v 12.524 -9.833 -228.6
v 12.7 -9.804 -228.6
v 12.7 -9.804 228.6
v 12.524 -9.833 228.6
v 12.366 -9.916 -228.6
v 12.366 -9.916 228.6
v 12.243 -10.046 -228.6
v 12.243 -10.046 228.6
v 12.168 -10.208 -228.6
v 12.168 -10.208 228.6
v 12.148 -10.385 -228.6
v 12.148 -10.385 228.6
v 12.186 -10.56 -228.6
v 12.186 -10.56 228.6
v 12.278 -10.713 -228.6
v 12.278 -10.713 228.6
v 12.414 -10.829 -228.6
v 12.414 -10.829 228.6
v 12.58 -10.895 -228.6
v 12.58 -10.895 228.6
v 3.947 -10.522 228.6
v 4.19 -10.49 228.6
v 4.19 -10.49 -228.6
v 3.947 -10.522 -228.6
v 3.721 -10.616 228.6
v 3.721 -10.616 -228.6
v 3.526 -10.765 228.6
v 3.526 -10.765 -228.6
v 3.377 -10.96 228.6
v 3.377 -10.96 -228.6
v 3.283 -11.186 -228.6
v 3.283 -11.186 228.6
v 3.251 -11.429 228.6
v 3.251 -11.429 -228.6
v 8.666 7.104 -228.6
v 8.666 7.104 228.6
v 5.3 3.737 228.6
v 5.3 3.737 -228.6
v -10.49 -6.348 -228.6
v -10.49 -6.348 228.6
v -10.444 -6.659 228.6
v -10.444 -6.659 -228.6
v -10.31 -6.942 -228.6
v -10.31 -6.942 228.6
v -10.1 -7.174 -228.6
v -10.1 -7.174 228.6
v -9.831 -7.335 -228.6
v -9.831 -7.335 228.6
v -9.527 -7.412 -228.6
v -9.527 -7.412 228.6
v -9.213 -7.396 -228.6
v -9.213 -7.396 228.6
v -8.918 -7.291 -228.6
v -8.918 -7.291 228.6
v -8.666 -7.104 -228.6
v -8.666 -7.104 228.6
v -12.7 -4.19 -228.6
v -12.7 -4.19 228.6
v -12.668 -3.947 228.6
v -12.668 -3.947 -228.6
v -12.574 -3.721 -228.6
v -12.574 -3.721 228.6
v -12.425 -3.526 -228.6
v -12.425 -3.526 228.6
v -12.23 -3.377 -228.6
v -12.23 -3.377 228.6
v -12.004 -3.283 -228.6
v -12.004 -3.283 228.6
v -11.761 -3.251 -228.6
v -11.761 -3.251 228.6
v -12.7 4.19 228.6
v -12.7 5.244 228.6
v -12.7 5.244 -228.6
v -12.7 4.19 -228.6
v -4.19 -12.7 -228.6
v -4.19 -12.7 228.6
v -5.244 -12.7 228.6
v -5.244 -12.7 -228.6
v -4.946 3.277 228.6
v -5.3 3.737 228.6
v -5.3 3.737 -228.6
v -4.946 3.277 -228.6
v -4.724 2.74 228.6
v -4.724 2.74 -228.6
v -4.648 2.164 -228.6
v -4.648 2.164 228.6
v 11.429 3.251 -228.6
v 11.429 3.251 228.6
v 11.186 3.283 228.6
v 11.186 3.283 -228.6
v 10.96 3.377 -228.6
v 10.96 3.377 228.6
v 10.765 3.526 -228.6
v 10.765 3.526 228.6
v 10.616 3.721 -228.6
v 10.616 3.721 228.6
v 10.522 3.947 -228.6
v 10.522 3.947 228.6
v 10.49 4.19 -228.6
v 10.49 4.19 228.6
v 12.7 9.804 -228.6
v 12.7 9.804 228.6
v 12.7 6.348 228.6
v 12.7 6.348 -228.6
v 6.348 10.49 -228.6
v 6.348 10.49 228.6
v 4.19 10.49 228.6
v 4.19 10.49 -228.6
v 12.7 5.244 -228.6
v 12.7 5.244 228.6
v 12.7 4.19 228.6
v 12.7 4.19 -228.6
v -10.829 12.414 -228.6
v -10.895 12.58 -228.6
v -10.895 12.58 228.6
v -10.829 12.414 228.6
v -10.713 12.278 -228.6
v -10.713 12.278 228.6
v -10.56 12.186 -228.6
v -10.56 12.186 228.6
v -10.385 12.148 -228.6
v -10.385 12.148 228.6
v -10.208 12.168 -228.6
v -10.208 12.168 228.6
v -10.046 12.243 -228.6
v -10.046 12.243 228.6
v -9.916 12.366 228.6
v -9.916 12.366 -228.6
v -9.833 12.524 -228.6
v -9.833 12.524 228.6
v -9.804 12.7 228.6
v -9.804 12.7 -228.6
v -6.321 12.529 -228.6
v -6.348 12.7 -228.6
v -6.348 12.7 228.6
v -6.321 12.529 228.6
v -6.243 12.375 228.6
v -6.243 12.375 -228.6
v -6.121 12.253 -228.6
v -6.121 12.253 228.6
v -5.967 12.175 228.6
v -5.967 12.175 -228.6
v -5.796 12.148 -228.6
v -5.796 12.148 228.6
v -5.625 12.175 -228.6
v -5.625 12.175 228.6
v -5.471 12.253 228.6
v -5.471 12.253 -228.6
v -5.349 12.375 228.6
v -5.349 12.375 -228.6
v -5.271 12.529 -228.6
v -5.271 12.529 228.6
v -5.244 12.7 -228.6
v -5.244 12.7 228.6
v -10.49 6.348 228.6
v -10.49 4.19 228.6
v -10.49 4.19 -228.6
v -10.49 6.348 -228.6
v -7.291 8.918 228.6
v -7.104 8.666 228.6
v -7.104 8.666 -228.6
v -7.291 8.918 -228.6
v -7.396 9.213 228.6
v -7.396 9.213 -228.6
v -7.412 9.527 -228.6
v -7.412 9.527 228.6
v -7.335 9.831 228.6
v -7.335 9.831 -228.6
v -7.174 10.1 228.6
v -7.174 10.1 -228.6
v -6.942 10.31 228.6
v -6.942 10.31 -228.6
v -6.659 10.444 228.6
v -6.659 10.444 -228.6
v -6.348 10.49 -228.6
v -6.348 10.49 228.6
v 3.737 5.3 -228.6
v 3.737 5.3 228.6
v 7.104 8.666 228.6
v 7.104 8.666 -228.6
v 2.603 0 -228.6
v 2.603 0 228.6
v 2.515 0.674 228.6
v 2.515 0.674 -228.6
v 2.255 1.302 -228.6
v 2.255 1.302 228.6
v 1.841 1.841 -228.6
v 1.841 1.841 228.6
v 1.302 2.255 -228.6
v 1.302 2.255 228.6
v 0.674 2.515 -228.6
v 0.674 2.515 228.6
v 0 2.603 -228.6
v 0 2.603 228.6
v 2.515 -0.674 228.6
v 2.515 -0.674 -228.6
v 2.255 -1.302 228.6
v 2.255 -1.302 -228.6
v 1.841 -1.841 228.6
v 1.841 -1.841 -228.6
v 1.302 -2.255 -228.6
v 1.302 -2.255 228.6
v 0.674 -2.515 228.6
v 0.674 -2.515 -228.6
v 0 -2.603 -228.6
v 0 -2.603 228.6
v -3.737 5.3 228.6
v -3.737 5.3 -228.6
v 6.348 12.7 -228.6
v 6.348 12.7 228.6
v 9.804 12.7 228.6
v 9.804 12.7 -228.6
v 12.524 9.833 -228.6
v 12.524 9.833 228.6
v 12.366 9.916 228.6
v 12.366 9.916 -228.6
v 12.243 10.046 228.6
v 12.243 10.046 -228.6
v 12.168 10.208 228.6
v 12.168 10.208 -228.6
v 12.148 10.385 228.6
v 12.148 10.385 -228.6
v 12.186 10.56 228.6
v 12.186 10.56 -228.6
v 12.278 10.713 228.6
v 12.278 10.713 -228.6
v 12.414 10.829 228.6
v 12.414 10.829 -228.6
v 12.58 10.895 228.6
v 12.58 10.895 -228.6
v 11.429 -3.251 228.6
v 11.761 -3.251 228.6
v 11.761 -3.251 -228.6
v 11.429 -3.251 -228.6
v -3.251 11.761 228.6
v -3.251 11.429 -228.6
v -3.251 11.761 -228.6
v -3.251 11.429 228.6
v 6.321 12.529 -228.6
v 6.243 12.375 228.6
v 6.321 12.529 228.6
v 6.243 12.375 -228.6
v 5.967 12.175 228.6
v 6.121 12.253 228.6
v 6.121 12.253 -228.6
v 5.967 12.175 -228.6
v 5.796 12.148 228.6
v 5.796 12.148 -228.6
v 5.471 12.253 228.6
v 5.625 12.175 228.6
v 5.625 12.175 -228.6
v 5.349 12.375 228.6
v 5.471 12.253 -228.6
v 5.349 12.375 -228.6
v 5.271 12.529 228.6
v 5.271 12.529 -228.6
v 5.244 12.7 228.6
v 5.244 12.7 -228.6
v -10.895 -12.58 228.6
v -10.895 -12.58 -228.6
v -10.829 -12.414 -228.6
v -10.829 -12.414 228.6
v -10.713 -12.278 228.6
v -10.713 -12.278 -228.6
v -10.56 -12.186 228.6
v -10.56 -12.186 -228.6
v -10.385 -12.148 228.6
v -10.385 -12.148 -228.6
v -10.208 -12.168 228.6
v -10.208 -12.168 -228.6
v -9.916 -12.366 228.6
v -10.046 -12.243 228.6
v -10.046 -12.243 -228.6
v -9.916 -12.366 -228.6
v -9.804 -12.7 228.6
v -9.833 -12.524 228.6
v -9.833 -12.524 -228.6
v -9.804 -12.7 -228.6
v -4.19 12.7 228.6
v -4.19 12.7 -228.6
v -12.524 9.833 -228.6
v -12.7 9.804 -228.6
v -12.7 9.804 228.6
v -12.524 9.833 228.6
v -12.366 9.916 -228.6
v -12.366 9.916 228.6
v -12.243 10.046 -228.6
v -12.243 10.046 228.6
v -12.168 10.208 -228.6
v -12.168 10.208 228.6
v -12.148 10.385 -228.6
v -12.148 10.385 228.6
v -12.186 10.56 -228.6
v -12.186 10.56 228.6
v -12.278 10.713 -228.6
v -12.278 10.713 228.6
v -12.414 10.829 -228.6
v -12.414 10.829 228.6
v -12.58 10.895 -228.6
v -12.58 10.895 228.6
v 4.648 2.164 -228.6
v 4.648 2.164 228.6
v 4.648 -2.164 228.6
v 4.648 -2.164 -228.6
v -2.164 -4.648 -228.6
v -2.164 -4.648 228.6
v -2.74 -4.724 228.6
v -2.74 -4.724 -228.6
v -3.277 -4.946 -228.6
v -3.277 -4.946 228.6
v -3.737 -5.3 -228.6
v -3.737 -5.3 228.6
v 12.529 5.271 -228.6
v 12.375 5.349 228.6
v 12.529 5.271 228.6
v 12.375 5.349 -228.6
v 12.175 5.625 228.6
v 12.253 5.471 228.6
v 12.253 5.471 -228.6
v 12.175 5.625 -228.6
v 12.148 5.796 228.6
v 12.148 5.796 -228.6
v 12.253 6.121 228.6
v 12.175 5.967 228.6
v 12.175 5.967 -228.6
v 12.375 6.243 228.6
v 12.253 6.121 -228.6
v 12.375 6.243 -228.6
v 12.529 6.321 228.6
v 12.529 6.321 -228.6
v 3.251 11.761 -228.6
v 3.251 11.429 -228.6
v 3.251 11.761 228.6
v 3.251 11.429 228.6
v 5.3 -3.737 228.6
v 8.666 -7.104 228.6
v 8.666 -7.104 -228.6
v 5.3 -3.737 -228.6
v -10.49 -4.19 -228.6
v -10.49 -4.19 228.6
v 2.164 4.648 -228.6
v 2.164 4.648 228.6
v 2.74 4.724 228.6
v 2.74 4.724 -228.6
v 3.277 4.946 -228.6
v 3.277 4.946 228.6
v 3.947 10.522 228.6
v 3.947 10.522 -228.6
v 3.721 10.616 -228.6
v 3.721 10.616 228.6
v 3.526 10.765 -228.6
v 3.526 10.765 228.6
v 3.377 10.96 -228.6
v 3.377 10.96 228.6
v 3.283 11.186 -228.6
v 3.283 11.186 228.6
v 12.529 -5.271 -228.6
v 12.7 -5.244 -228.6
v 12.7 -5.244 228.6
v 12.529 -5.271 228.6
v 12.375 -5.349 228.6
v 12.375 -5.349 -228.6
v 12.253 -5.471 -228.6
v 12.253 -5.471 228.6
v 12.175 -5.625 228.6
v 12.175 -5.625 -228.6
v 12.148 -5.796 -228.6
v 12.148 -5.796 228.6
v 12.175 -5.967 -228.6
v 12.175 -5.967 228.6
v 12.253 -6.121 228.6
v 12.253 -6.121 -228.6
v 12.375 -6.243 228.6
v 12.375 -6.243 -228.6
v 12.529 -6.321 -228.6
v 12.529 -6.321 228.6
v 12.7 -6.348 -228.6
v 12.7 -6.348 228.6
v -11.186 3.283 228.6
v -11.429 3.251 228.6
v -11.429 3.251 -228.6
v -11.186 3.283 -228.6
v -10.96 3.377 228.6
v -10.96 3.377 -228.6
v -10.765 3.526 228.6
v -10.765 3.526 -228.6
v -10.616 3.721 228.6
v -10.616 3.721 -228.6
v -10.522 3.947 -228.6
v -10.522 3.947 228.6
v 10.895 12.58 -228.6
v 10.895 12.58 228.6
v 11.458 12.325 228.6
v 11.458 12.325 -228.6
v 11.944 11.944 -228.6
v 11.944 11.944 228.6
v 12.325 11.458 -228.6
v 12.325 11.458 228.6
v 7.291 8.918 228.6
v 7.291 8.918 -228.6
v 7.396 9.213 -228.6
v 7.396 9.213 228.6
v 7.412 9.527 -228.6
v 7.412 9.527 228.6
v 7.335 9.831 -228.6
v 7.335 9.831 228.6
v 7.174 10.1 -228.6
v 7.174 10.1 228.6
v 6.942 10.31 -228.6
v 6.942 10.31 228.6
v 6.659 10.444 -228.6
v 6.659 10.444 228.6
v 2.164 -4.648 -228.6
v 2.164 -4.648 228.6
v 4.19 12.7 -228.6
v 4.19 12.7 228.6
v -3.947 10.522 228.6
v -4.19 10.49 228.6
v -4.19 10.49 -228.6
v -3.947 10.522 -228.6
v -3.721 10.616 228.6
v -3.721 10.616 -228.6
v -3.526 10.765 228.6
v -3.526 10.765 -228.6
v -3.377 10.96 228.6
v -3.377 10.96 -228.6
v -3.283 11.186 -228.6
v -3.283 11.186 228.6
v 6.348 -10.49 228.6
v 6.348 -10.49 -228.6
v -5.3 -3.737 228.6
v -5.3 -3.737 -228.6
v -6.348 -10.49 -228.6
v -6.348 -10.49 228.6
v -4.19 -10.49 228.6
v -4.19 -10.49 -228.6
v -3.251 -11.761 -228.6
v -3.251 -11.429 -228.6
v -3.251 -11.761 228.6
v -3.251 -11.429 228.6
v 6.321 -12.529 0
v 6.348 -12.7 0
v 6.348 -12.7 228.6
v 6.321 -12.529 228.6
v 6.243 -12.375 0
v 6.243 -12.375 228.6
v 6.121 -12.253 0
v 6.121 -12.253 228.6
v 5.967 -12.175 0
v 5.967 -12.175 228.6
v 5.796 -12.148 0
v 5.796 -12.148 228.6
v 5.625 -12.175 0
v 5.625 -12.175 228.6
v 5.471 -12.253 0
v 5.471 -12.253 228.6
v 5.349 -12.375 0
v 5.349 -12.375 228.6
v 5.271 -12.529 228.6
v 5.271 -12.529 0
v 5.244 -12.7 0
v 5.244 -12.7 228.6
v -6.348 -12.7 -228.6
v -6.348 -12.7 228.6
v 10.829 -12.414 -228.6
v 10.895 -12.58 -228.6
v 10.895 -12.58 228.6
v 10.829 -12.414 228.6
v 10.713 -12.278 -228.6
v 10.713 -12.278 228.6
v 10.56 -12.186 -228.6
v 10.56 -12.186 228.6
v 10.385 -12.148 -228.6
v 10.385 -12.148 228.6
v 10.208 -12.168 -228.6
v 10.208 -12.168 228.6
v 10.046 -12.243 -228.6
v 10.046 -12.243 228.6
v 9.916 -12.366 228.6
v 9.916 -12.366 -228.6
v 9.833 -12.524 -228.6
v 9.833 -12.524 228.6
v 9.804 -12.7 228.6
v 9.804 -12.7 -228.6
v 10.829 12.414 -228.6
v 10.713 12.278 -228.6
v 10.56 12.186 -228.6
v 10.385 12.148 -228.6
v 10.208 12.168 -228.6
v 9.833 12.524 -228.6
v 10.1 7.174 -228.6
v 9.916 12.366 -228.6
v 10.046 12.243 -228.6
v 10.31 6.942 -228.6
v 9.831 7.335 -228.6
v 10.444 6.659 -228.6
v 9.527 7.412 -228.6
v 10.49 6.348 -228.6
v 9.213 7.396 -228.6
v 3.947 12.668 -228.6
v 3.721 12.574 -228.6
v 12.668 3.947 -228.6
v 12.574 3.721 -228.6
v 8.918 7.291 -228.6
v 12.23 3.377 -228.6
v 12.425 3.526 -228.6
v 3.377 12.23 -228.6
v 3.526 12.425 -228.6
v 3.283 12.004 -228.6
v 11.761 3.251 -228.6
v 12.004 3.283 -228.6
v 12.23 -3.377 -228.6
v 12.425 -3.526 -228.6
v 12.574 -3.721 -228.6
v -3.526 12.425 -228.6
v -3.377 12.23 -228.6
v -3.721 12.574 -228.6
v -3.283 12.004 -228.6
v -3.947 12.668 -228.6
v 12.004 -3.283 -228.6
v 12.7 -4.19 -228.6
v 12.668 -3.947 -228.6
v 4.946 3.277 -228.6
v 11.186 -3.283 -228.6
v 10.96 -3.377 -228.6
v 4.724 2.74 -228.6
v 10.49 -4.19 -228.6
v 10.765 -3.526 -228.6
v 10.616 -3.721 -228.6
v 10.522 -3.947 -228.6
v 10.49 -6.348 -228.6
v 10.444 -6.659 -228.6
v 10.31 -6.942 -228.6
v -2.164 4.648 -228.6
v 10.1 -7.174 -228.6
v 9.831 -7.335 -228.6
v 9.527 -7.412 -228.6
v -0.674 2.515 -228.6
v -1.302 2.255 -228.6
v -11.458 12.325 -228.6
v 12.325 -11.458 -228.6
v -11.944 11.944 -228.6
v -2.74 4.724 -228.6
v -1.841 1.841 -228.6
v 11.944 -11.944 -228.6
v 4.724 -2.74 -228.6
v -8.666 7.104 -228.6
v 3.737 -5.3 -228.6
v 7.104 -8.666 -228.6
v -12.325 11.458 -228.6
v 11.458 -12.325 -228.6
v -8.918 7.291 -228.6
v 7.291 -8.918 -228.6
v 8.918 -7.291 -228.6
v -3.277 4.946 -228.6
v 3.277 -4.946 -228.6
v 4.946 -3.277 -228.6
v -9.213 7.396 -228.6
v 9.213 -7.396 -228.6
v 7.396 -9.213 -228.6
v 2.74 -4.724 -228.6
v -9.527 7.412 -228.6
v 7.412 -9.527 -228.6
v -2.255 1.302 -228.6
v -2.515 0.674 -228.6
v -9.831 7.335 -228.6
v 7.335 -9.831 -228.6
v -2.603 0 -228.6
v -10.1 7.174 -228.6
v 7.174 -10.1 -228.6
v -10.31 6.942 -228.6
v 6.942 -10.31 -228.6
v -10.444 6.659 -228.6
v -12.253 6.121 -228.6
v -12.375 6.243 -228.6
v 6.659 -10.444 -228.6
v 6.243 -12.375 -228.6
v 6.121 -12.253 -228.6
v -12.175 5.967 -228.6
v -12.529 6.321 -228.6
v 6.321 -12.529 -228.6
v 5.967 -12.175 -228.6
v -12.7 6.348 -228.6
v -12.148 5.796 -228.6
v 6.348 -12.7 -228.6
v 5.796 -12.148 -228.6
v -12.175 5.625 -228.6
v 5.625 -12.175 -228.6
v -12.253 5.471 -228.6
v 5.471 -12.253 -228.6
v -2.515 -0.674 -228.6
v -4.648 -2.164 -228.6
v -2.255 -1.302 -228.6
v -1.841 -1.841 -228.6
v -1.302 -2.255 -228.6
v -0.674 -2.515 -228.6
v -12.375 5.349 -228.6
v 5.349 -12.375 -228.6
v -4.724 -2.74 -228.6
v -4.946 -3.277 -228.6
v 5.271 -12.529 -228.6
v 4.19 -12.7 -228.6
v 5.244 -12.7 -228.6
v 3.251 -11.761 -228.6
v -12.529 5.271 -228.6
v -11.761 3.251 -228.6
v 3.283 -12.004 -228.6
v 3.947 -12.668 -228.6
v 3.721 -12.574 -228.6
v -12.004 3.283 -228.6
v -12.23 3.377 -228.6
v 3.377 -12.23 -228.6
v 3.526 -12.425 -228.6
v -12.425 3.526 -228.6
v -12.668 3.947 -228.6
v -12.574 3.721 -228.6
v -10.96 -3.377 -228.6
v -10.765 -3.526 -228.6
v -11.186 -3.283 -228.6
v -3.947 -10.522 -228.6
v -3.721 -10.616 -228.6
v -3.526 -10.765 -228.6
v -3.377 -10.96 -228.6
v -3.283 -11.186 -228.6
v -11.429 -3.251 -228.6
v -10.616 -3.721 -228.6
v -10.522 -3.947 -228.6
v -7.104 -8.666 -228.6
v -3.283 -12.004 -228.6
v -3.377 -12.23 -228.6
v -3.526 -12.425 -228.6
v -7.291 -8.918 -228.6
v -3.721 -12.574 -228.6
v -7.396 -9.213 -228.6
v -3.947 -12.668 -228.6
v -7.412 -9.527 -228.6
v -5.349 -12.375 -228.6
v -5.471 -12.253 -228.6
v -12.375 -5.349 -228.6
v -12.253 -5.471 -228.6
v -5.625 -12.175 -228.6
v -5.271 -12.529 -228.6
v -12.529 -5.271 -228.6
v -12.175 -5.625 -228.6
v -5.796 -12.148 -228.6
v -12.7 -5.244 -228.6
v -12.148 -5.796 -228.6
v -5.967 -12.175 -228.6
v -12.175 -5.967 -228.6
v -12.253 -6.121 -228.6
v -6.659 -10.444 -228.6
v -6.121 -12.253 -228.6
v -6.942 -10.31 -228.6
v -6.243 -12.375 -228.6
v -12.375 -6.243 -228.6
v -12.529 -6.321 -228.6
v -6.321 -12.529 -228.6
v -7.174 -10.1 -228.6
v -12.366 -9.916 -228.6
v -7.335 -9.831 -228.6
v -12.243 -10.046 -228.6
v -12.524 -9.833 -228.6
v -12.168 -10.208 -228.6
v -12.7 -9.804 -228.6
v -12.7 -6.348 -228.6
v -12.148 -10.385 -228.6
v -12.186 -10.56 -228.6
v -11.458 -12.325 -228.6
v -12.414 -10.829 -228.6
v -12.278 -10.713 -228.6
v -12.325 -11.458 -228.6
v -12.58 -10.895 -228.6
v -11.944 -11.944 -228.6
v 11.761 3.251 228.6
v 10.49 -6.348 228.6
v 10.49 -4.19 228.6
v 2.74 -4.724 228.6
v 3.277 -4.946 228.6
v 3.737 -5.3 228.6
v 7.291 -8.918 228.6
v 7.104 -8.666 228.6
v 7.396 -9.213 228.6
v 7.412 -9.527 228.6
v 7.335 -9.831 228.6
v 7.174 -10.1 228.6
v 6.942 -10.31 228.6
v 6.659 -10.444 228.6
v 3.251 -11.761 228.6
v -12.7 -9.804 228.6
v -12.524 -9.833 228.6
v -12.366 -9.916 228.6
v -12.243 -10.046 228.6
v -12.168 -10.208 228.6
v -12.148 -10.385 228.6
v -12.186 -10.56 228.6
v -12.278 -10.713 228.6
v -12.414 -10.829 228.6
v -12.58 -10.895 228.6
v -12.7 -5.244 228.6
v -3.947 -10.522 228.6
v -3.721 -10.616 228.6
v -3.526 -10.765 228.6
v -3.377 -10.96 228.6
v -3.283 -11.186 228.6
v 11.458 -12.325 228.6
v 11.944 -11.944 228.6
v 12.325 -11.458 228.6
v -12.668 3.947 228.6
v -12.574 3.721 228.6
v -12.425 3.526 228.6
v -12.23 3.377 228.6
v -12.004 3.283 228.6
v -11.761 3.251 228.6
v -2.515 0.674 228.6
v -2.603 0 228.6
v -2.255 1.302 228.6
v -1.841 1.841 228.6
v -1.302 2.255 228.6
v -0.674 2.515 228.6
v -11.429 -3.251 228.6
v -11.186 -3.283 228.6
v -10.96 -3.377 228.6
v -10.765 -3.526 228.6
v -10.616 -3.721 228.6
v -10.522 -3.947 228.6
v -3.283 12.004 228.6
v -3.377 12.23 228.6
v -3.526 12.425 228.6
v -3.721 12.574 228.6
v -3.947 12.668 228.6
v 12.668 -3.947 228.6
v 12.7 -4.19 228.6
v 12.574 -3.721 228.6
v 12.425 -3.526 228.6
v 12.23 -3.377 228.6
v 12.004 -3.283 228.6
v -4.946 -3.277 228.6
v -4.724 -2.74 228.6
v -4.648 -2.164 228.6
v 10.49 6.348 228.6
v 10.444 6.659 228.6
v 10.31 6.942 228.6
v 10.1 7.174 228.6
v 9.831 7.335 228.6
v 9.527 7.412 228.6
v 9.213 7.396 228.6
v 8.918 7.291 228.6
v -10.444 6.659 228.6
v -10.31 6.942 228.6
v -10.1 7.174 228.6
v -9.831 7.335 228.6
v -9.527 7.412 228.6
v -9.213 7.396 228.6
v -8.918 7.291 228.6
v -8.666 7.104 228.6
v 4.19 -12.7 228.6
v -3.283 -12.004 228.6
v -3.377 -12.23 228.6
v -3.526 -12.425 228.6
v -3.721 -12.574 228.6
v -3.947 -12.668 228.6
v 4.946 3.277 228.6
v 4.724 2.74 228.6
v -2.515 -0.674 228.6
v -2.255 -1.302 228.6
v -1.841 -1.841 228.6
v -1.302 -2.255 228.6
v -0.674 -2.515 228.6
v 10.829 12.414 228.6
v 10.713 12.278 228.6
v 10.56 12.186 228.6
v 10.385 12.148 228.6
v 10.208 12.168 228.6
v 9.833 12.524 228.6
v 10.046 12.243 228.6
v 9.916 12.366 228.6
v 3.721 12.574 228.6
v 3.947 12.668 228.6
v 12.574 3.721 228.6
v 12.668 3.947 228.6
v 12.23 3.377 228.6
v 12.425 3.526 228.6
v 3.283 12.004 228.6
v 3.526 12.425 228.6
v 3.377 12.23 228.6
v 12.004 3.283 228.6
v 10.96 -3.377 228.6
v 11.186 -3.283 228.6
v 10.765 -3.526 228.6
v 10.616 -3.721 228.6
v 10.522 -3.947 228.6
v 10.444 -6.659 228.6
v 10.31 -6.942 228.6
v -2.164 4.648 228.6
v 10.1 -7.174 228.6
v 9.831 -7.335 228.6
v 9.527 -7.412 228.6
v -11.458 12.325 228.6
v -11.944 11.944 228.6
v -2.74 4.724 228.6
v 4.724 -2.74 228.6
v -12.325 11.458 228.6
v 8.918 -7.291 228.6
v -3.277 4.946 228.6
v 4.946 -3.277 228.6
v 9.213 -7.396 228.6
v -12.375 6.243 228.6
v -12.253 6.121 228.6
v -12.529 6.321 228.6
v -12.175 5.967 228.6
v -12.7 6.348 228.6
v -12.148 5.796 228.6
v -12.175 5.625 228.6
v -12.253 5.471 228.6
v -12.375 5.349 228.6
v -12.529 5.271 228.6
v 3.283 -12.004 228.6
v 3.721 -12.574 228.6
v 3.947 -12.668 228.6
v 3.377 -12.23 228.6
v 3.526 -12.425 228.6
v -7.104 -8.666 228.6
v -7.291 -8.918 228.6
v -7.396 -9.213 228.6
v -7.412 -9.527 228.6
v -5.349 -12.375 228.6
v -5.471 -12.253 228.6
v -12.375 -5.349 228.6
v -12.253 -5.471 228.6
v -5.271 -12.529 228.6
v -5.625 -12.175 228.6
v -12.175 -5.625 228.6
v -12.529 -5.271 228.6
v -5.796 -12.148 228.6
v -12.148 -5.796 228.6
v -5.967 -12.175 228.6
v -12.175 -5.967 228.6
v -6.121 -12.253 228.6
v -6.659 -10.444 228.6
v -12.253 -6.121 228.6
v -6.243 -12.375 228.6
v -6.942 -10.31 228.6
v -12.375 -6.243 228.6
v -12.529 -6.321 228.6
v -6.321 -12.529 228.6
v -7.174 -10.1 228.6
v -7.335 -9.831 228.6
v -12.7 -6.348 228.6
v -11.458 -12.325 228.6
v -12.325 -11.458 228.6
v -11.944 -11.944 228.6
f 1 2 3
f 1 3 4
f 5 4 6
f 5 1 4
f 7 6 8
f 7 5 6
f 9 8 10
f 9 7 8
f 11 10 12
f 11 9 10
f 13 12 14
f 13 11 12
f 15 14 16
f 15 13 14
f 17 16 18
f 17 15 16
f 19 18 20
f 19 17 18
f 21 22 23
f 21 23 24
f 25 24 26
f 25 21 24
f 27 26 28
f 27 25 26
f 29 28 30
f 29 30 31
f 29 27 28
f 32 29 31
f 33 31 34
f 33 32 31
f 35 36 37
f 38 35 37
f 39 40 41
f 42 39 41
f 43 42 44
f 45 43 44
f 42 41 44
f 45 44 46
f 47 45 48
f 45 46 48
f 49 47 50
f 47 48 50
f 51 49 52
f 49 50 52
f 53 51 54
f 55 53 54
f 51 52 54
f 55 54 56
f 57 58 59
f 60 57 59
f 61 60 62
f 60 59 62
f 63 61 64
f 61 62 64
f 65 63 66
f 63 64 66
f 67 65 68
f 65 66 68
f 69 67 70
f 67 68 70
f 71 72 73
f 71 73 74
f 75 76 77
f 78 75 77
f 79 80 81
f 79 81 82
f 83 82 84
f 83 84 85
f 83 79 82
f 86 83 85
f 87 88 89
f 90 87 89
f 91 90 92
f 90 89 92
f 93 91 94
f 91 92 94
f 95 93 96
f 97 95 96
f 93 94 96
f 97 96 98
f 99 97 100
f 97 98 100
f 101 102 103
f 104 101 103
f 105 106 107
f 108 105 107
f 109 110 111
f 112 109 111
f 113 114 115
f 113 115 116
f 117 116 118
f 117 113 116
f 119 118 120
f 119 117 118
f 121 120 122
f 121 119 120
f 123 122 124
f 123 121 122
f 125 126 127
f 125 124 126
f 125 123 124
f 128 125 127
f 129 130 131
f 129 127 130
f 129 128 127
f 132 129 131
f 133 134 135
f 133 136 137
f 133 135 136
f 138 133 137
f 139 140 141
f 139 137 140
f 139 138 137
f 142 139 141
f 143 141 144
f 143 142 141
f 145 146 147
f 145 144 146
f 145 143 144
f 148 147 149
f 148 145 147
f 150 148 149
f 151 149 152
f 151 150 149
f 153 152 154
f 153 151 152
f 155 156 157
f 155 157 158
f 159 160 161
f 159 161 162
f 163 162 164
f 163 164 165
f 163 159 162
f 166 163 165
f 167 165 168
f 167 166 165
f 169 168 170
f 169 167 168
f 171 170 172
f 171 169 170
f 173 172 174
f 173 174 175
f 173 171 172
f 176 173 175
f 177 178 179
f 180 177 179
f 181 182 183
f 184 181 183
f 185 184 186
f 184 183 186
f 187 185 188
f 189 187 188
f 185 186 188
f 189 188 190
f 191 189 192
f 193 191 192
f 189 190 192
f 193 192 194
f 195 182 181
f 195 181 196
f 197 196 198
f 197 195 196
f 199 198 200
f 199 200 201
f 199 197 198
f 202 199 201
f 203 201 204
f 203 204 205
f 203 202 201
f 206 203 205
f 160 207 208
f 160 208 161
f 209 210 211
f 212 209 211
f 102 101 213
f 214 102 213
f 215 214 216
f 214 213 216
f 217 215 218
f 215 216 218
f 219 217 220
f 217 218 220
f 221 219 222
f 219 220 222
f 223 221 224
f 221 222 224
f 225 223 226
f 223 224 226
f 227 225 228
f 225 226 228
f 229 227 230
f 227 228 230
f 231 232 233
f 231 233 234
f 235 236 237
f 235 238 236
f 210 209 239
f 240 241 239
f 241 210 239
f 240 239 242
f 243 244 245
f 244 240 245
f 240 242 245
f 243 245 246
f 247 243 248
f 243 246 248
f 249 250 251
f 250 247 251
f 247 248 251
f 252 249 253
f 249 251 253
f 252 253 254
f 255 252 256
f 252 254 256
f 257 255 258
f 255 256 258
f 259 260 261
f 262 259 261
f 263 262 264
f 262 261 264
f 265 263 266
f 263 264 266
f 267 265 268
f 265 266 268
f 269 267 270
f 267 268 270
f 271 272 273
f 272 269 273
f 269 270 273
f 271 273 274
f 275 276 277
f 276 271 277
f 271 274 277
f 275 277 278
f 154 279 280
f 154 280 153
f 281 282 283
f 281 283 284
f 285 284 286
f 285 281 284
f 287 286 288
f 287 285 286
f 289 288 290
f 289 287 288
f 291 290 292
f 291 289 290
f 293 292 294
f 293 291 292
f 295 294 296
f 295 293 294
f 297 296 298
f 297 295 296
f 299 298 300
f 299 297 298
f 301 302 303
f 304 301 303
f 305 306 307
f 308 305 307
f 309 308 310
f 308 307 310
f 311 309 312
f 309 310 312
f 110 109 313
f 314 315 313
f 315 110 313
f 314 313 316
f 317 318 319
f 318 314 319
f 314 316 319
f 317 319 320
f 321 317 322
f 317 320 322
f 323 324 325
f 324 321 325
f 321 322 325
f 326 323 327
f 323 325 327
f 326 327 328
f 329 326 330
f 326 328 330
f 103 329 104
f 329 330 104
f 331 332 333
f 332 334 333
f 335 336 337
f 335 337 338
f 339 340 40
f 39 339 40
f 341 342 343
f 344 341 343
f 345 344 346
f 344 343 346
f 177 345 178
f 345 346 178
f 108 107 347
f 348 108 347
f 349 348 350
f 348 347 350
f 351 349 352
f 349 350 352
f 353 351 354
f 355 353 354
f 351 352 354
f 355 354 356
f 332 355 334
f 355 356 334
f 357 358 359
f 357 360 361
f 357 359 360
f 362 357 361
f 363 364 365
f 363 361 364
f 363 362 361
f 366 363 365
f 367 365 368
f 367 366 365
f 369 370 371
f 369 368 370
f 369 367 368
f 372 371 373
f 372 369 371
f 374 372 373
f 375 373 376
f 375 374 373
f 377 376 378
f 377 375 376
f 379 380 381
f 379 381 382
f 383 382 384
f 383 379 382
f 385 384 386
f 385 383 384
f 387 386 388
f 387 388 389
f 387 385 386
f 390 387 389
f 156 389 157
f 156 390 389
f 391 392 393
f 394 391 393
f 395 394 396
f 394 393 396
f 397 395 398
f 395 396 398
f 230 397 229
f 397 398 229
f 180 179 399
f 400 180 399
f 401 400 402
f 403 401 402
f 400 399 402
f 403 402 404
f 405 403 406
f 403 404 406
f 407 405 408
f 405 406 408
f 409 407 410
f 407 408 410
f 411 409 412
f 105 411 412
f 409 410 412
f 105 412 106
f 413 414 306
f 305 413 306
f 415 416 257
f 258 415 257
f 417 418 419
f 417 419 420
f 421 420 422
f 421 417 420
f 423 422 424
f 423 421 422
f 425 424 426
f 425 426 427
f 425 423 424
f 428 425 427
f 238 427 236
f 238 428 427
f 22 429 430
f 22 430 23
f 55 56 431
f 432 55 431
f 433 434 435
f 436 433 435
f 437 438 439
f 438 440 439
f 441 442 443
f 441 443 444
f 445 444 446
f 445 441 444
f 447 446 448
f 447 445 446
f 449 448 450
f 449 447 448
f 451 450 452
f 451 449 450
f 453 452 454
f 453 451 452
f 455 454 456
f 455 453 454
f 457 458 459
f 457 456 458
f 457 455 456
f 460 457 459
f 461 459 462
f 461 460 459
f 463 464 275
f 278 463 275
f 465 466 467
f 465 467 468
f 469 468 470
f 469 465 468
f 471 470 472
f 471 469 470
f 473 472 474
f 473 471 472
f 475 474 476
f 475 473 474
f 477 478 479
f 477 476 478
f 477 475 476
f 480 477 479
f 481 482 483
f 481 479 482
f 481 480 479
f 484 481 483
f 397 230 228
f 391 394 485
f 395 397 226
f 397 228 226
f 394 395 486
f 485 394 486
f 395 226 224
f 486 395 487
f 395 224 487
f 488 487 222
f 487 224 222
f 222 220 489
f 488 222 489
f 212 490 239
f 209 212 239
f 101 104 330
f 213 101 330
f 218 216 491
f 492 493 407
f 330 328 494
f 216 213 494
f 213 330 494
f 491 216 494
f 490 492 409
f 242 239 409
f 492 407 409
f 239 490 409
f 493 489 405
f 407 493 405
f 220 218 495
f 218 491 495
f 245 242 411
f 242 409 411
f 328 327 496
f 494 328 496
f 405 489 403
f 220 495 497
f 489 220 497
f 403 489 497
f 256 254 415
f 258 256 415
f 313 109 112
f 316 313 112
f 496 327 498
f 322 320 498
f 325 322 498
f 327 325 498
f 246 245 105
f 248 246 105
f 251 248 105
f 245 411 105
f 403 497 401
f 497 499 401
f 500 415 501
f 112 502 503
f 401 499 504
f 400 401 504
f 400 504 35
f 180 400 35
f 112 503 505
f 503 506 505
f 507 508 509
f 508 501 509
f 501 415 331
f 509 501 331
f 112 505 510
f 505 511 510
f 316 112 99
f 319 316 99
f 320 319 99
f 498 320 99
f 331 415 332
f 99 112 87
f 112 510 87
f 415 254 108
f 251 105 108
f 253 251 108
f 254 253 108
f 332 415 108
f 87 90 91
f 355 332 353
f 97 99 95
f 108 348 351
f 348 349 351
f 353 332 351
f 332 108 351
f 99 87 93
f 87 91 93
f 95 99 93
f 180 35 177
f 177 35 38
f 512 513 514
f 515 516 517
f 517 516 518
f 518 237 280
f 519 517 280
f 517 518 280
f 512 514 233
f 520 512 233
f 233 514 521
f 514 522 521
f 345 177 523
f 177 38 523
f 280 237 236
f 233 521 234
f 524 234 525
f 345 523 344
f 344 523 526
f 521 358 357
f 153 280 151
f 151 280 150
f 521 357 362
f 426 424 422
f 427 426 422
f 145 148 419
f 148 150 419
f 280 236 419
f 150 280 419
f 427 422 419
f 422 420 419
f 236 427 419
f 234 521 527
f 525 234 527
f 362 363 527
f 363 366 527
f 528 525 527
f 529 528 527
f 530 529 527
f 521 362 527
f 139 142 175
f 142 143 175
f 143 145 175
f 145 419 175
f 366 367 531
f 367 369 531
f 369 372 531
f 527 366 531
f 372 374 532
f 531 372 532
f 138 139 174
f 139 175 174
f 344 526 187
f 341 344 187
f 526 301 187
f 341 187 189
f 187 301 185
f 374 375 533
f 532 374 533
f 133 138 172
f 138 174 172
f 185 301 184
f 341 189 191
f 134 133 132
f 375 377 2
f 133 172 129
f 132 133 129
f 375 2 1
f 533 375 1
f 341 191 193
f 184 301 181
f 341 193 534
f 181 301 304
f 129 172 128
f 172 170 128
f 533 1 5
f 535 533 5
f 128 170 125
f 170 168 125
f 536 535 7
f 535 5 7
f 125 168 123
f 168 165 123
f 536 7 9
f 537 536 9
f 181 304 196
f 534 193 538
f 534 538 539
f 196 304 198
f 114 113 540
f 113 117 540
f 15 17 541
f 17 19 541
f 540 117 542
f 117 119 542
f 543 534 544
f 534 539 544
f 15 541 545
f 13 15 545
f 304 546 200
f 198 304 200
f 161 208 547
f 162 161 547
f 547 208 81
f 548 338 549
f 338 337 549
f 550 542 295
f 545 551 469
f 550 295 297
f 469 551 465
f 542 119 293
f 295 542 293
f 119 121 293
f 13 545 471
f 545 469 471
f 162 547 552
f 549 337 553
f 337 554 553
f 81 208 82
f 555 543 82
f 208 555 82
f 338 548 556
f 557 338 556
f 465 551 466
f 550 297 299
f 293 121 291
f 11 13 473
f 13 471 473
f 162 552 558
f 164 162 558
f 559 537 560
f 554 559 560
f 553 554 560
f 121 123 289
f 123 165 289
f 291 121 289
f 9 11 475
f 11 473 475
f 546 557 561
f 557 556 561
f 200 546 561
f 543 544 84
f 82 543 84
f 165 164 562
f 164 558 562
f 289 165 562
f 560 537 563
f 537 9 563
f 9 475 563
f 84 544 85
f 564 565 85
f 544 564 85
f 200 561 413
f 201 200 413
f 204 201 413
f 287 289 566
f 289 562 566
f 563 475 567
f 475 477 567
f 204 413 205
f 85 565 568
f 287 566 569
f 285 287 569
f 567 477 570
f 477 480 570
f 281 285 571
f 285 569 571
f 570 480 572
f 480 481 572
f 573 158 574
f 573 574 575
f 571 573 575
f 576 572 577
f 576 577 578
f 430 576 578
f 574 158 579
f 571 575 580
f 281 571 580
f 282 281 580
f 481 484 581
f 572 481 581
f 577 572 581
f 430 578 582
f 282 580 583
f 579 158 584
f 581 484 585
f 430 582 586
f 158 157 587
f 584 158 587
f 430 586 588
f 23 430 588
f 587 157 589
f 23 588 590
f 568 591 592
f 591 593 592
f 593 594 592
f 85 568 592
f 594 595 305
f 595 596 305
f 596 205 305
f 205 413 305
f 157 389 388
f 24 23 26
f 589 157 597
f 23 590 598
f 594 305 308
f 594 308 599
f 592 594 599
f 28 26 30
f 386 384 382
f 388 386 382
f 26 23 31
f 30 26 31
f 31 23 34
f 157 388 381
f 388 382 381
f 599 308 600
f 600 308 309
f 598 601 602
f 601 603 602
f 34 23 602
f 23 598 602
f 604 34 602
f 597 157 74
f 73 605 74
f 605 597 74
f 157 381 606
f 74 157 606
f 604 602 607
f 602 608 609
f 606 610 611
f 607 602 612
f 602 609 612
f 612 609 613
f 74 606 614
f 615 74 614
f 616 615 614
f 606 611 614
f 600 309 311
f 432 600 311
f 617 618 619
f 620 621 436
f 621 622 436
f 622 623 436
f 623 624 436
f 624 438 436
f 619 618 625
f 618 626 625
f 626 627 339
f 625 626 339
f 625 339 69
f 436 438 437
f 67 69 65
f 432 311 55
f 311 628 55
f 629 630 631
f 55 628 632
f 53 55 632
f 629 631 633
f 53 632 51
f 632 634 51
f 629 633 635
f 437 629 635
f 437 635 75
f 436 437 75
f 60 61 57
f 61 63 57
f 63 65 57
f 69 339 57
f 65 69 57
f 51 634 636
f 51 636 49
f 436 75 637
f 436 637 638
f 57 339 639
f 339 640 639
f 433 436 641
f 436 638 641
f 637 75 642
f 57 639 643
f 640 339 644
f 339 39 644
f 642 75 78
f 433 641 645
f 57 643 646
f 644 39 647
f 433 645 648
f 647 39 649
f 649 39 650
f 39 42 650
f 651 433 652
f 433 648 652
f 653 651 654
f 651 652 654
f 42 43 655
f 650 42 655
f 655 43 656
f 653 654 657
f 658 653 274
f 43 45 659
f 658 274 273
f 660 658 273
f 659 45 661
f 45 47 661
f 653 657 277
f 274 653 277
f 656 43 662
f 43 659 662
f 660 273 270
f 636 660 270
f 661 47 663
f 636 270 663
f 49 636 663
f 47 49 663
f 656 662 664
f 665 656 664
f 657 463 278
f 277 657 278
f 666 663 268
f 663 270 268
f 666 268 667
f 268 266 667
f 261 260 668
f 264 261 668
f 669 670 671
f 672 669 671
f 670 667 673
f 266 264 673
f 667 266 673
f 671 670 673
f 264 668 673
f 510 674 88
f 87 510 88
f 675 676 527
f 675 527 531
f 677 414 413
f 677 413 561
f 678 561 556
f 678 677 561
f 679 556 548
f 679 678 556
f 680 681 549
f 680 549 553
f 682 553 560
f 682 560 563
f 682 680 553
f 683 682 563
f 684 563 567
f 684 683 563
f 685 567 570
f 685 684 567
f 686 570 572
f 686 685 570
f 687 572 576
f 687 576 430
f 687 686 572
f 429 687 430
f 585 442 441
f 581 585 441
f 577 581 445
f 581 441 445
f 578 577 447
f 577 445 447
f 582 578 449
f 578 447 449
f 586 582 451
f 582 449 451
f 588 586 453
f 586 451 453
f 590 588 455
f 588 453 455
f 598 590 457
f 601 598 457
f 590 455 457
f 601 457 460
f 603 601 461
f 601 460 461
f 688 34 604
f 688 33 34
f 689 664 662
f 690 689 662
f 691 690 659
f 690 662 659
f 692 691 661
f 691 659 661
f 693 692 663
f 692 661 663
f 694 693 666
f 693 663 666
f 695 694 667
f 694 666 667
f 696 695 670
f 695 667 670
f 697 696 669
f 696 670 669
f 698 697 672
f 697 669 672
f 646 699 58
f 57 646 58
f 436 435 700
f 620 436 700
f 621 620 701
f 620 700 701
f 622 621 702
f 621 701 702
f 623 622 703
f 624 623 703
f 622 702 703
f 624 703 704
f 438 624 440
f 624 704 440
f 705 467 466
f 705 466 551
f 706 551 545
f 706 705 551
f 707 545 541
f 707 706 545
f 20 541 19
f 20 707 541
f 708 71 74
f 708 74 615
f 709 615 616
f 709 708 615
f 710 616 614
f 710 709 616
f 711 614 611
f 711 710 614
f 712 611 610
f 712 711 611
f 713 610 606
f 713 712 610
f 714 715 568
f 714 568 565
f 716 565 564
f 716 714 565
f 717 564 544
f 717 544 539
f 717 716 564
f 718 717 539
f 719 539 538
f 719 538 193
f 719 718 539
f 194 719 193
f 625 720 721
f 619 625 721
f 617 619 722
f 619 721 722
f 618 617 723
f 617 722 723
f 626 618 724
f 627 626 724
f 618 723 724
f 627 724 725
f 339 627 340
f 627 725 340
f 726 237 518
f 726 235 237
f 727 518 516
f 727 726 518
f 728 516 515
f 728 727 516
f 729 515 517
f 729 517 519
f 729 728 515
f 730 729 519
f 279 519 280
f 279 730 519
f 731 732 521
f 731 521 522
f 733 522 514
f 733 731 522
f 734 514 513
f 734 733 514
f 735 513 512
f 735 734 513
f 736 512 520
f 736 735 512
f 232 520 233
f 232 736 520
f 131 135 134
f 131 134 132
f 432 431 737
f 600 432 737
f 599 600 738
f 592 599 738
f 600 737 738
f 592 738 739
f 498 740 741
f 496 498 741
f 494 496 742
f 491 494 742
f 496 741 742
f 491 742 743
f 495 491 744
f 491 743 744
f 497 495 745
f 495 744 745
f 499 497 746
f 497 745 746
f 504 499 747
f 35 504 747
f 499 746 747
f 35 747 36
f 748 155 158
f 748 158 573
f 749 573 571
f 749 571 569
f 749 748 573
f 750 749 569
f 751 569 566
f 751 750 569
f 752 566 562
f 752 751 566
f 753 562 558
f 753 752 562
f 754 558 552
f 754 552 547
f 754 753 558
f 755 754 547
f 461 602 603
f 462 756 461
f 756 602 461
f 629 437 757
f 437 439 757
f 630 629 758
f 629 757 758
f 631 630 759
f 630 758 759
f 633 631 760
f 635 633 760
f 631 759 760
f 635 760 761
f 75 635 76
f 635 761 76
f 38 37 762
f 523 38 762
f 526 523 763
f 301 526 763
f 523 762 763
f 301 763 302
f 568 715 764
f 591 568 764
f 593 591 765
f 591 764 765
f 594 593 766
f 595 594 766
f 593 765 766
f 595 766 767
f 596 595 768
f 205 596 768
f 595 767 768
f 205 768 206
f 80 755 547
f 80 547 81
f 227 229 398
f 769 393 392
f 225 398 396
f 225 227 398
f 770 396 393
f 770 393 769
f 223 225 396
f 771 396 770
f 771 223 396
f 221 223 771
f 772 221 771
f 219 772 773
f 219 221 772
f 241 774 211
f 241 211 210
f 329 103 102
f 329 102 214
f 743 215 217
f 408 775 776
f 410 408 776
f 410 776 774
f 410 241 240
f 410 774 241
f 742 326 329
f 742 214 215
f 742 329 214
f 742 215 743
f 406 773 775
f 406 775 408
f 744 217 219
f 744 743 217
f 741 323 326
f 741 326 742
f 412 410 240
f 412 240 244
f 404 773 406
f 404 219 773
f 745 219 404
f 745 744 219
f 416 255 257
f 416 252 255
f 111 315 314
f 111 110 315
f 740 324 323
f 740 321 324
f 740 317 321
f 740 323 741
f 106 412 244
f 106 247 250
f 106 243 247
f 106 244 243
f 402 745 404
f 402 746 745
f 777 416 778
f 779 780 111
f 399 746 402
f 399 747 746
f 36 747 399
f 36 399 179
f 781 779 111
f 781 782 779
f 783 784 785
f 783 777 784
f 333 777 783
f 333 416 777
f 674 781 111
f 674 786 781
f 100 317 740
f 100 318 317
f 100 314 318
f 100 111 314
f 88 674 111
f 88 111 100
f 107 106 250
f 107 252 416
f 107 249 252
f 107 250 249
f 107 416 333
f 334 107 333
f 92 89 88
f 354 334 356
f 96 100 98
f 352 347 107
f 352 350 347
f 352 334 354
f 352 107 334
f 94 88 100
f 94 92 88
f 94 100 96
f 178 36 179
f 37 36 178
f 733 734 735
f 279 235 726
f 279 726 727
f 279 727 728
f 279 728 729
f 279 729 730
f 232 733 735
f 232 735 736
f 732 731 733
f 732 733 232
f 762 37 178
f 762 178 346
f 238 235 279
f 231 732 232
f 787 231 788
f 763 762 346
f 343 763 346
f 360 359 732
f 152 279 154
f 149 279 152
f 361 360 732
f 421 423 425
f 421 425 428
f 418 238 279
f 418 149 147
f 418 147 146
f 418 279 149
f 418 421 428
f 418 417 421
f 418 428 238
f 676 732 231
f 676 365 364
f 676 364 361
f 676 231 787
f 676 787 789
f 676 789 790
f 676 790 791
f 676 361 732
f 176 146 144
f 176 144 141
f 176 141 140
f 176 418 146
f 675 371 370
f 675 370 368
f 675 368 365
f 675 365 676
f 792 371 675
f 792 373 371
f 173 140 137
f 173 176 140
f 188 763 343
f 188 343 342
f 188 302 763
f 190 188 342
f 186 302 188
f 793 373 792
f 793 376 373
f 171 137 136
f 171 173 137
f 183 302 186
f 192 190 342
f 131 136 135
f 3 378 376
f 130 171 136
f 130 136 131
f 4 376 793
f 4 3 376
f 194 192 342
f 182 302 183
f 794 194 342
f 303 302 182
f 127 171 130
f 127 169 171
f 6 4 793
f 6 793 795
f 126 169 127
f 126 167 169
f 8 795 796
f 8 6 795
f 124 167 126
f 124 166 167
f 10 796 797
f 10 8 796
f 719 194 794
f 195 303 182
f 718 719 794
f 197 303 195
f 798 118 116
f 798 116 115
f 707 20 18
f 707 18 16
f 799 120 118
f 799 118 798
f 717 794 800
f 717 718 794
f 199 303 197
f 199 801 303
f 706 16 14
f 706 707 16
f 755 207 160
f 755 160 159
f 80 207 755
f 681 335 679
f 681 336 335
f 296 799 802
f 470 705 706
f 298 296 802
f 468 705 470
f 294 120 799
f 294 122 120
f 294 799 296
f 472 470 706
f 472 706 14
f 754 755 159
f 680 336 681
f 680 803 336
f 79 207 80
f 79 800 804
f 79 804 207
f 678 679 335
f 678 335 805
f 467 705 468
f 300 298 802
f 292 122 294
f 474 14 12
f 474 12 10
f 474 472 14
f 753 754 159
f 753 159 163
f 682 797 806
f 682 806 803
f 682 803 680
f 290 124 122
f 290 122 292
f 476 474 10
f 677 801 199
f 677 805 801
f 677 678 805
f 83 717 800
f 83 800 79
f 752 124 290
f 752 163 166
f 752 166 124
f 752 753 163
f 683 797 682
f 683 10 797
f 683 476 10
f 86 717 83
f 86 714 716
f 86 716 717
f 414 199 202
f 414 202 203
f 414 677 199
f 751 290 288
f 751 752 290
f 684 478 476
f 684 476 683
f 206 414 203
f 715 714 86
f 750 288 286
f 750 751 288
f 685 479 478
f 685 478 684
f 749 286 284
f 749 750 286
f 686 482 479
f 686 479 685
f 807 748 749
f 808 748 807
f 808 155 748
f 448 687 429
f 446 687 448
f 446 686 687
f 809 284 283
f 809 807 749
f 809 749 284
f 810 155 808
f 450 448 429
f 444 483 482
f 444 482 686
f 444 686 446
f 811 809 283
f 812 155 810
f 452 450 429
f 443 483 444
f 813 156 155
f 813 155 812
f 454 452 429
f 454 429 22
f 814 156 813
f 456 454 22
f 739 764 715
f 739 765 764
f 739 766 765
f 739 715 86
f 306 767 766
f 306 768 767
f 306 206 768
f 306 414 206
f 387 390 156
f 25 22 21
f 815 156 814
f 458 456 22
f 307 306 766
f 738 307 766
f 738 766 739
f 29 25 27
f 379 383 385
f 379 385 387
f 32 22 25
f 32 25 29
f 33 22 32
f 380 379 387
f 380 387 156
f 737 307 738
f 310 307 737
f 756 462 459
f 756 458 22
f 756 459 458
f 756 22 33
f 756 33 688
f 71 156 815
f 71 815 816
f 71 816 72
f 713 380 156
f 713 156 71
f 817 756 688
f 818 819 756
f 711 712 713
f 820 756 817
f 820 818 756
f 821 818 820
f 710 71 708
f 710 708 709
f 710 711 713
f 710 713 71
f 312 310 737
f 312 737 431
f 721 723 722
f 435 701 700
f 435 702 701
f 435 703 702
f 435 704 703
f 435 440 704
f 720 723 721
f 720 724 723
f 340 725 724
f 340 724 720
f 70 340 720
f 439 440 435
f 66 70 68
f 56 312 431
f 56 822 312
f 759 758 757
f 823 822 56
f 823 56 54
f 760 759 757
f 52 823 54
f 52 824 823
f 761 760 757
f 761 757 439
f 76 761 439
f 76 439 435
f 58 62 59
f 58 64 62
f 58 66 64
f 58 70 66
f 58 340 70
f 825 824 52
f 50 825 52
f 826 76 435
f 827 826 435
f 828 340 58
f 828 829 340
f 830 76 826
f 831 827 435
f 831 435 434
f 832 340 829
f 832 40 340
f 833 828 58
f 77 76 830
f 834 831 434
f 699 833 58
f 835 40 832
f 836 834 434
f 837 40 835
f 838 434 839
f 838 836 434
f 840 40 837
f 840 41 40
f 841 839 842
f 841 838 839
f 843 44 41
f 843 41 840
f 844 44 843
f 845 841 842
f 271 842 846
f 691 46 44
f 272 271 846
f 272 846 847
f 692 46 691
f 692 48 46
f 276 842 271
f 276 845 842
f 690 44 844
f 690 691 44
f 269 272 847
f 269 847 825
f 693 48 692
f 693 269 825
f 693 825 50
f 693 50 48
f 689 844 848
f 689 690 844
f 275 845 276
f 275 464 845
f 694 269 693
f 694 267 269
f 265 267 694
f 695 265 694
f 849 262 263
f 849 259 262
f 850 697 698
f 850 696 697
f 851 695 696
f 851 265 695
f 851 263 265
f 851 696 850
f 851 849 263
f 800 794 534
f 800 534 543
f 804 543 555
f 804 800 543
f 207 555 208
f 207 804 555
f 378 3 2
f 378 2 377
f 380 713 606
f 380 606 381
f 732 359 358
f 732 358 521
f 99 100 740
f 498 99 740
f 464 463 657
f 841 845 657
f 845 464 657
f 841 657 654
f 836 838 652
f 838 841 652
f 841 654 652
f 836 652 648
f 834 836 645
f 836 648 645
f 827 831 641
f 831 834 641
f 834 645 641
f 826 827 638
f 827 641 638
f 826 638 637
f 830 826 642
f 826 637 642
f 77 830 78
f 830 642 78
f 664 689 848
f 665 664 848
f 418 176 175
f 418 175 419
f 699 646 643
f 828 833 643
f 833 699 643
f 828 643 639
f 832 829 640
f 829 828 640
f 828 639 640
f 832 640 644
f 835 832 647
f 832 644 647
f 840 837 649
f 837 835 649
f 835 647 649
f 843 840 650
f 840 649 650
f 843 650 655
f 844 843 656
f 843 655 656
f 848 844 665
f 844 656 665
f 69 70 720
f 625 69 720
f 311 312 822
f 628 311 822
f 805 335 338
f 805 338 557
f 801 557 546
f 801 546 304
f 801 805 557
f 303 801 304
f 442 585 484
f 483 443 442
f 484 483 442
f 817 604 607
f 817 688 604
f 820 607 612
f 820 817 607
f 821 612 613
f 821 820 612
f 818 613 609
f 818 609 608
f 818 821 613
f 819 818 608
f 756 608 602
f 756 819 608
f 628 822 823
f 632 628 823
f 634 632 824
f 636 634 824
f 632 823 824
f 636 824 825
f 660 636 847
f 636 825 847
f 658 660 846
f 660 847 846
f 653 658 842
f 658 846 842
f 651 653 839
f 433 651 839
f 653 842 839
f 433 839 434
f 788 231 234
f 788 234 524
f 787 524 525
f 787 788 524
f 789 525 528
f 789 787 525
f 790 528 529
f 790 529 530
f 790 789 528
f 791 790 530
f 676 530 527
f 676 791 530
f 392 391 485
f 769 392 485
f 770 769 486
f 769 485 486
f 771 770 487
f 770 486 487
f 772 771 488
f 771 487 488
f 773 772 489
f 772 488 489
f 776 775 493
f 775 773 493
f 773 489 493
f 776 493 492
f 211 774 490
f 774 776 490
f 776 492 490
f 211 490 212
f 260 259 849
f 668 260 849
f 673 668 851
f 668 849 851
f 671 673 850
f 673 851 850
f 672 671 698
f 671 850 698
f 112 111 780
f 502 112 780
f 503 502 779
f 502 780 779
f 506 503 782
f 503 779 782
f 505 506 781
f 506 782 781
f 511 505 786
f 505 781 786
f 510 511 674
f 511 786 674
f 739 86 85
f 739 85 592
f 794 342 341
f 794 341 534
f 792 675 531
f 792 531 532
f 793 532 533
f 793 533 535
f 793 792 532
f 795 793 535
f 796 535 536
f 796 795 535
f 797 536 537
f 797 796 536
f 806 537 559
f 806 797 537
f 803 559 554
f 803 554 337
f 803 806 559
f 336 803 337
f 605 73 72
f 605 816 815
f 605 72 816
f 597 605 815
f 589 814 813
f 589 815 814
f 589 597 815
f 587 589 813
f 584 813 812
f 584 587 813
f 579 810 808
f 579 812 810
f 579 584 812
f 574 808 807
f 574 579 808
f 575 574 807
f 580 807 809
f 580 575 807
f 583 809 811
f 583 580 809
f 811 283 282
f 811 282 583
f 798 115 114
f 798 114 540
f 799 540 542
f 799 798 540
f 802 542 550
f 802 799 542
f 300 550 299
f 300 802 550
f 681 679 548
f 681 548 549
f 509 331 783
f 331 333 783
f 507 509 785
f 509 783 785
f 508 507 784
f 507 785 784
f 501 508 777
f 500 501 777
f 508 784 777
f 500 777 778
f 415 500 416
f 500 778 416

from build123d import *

# Parameters (mm, degrees)
BOSS_EXTRUDE1_DEPTH     = 228.6
SKETCH5_R               = 0.55245
CUT_EXTRUDE1_DEPTH      = 229.6
CUT_EXTRUDE1_DEPTH_BACK = 229.6


with BuildPart() as part:
    # Sketch4 → Boss-Extrude1 (new body, symmetric)
    with BuildSketch(Plane.XY):
        with BuildLine():
            Line((4.190365, -12.7), (10.11729625, -12.7))
            ThreePointArc((10.11729625, -12.7), (11.943543585, -11.943543585), (12.7, -10.11729625))
            Line((12.7, -10.11729625), (12.7, -4.190365))
            ThreePointArc((12.7, -4.190365), (12.42492494, -3.52627506), (11.760835, -3.2512))
            Line((11.760835, -3.2512), (11.429365, -3.2512))
            ThreePointArc((11.429365, -3.2512), (10.76527506, -3.52627506), (10.4902, -4.190365))
            Line((10.4902, -4.190365), (10.4902, -6.348478019))
            ThreePointArc((10.4902, -6.348478019), (9.830707141, -7.335478831), (8.666460301, -7.103895736))
            Line((8.666460301, -7.103895736), (5.299899128, -3.737334563))
            ThreePointArc((5.299899128, -3.737334563), (4.817571085, -3.015479634), (4.6482, -2.16399369))
            Line((4.6482, -2.16399369), (4.6482, 0))
            Line((4.6482, 0), (2.6035, 0))
            ThreePointArc((2.6035, 0), (1.840952505, -1.840952505), (0, -2.6035))
            Line((0, -2.6035), (0, -4.6482))
            Line((0, -4.6482), (2.16399369, -4.6482))
            ThreePointArc((2.16399369, -4.6482), (3.015479634, -4.817571085), (3.737334563, -5.299899128))
            Line((3.737334563, -5.299899128), (7.103895736, -8.666460301))
            ThreePointArc((7.103895736, -8.666460301), (7.335478831, -9.830707141), (6.348478019, -10.4902))
            Line((6.348478019, -10.4902), (4.190365, -10.4902))
            ThreePointArc((4.190365, -10.4902), (3.52627506, -10.76527506), (3.2512, -11.429365))
            Line((3.2512, -11.429365), (3.2512, -11.760835))
            ThreePointArc((3.2512, -11.760835), (3.52627506, -12.42492494), (4.190365, -12.7))
        make_face()
    extrude(amount=BOSS_EXTRUDE1_DEPTH, both=True)

    # Sketch5 → Cut-Extrude1 (cut, two sides)
    with BuildSketch(Plane.XY) as cut_extrude1_sk:
        with Locations((10.356153152, -12.7)):
            Circle(SKETCH5_R)
        with Locations((5.796028019, -12.7)):
            Circle(SKETCH5_R)
        with Locations((12.7, -10.356153152)):
            Circle(SKETCH5_R)
        with Locations((12.7, -5.796028019)):
            Circle(SKETCH5_R)
    extrude(amount=CUT_EXTRUDE1_DEPTH, mode=Mode.SUBTRACT)
    extrude(cut_extrude1_sk.sketch, amount=-CUT_EXTRUDE1_DEPTH_BACK, mode=Mode.SUBTRACT)

    # Mirror1: part across plane


with BuildPart() as part_1:
    add(part.part)
    add(part.part.mirror(Plane(origin=(0, 0, 0), x_dir=(0, 0, 1), z_dir=(1, 0, 0))))

    # Mirror2: part across plane


with BuildPart() as part_2:
    add(part_1.part)
    add(part_1.part.mirror(Plane.ZX))


solid = part_2.part
